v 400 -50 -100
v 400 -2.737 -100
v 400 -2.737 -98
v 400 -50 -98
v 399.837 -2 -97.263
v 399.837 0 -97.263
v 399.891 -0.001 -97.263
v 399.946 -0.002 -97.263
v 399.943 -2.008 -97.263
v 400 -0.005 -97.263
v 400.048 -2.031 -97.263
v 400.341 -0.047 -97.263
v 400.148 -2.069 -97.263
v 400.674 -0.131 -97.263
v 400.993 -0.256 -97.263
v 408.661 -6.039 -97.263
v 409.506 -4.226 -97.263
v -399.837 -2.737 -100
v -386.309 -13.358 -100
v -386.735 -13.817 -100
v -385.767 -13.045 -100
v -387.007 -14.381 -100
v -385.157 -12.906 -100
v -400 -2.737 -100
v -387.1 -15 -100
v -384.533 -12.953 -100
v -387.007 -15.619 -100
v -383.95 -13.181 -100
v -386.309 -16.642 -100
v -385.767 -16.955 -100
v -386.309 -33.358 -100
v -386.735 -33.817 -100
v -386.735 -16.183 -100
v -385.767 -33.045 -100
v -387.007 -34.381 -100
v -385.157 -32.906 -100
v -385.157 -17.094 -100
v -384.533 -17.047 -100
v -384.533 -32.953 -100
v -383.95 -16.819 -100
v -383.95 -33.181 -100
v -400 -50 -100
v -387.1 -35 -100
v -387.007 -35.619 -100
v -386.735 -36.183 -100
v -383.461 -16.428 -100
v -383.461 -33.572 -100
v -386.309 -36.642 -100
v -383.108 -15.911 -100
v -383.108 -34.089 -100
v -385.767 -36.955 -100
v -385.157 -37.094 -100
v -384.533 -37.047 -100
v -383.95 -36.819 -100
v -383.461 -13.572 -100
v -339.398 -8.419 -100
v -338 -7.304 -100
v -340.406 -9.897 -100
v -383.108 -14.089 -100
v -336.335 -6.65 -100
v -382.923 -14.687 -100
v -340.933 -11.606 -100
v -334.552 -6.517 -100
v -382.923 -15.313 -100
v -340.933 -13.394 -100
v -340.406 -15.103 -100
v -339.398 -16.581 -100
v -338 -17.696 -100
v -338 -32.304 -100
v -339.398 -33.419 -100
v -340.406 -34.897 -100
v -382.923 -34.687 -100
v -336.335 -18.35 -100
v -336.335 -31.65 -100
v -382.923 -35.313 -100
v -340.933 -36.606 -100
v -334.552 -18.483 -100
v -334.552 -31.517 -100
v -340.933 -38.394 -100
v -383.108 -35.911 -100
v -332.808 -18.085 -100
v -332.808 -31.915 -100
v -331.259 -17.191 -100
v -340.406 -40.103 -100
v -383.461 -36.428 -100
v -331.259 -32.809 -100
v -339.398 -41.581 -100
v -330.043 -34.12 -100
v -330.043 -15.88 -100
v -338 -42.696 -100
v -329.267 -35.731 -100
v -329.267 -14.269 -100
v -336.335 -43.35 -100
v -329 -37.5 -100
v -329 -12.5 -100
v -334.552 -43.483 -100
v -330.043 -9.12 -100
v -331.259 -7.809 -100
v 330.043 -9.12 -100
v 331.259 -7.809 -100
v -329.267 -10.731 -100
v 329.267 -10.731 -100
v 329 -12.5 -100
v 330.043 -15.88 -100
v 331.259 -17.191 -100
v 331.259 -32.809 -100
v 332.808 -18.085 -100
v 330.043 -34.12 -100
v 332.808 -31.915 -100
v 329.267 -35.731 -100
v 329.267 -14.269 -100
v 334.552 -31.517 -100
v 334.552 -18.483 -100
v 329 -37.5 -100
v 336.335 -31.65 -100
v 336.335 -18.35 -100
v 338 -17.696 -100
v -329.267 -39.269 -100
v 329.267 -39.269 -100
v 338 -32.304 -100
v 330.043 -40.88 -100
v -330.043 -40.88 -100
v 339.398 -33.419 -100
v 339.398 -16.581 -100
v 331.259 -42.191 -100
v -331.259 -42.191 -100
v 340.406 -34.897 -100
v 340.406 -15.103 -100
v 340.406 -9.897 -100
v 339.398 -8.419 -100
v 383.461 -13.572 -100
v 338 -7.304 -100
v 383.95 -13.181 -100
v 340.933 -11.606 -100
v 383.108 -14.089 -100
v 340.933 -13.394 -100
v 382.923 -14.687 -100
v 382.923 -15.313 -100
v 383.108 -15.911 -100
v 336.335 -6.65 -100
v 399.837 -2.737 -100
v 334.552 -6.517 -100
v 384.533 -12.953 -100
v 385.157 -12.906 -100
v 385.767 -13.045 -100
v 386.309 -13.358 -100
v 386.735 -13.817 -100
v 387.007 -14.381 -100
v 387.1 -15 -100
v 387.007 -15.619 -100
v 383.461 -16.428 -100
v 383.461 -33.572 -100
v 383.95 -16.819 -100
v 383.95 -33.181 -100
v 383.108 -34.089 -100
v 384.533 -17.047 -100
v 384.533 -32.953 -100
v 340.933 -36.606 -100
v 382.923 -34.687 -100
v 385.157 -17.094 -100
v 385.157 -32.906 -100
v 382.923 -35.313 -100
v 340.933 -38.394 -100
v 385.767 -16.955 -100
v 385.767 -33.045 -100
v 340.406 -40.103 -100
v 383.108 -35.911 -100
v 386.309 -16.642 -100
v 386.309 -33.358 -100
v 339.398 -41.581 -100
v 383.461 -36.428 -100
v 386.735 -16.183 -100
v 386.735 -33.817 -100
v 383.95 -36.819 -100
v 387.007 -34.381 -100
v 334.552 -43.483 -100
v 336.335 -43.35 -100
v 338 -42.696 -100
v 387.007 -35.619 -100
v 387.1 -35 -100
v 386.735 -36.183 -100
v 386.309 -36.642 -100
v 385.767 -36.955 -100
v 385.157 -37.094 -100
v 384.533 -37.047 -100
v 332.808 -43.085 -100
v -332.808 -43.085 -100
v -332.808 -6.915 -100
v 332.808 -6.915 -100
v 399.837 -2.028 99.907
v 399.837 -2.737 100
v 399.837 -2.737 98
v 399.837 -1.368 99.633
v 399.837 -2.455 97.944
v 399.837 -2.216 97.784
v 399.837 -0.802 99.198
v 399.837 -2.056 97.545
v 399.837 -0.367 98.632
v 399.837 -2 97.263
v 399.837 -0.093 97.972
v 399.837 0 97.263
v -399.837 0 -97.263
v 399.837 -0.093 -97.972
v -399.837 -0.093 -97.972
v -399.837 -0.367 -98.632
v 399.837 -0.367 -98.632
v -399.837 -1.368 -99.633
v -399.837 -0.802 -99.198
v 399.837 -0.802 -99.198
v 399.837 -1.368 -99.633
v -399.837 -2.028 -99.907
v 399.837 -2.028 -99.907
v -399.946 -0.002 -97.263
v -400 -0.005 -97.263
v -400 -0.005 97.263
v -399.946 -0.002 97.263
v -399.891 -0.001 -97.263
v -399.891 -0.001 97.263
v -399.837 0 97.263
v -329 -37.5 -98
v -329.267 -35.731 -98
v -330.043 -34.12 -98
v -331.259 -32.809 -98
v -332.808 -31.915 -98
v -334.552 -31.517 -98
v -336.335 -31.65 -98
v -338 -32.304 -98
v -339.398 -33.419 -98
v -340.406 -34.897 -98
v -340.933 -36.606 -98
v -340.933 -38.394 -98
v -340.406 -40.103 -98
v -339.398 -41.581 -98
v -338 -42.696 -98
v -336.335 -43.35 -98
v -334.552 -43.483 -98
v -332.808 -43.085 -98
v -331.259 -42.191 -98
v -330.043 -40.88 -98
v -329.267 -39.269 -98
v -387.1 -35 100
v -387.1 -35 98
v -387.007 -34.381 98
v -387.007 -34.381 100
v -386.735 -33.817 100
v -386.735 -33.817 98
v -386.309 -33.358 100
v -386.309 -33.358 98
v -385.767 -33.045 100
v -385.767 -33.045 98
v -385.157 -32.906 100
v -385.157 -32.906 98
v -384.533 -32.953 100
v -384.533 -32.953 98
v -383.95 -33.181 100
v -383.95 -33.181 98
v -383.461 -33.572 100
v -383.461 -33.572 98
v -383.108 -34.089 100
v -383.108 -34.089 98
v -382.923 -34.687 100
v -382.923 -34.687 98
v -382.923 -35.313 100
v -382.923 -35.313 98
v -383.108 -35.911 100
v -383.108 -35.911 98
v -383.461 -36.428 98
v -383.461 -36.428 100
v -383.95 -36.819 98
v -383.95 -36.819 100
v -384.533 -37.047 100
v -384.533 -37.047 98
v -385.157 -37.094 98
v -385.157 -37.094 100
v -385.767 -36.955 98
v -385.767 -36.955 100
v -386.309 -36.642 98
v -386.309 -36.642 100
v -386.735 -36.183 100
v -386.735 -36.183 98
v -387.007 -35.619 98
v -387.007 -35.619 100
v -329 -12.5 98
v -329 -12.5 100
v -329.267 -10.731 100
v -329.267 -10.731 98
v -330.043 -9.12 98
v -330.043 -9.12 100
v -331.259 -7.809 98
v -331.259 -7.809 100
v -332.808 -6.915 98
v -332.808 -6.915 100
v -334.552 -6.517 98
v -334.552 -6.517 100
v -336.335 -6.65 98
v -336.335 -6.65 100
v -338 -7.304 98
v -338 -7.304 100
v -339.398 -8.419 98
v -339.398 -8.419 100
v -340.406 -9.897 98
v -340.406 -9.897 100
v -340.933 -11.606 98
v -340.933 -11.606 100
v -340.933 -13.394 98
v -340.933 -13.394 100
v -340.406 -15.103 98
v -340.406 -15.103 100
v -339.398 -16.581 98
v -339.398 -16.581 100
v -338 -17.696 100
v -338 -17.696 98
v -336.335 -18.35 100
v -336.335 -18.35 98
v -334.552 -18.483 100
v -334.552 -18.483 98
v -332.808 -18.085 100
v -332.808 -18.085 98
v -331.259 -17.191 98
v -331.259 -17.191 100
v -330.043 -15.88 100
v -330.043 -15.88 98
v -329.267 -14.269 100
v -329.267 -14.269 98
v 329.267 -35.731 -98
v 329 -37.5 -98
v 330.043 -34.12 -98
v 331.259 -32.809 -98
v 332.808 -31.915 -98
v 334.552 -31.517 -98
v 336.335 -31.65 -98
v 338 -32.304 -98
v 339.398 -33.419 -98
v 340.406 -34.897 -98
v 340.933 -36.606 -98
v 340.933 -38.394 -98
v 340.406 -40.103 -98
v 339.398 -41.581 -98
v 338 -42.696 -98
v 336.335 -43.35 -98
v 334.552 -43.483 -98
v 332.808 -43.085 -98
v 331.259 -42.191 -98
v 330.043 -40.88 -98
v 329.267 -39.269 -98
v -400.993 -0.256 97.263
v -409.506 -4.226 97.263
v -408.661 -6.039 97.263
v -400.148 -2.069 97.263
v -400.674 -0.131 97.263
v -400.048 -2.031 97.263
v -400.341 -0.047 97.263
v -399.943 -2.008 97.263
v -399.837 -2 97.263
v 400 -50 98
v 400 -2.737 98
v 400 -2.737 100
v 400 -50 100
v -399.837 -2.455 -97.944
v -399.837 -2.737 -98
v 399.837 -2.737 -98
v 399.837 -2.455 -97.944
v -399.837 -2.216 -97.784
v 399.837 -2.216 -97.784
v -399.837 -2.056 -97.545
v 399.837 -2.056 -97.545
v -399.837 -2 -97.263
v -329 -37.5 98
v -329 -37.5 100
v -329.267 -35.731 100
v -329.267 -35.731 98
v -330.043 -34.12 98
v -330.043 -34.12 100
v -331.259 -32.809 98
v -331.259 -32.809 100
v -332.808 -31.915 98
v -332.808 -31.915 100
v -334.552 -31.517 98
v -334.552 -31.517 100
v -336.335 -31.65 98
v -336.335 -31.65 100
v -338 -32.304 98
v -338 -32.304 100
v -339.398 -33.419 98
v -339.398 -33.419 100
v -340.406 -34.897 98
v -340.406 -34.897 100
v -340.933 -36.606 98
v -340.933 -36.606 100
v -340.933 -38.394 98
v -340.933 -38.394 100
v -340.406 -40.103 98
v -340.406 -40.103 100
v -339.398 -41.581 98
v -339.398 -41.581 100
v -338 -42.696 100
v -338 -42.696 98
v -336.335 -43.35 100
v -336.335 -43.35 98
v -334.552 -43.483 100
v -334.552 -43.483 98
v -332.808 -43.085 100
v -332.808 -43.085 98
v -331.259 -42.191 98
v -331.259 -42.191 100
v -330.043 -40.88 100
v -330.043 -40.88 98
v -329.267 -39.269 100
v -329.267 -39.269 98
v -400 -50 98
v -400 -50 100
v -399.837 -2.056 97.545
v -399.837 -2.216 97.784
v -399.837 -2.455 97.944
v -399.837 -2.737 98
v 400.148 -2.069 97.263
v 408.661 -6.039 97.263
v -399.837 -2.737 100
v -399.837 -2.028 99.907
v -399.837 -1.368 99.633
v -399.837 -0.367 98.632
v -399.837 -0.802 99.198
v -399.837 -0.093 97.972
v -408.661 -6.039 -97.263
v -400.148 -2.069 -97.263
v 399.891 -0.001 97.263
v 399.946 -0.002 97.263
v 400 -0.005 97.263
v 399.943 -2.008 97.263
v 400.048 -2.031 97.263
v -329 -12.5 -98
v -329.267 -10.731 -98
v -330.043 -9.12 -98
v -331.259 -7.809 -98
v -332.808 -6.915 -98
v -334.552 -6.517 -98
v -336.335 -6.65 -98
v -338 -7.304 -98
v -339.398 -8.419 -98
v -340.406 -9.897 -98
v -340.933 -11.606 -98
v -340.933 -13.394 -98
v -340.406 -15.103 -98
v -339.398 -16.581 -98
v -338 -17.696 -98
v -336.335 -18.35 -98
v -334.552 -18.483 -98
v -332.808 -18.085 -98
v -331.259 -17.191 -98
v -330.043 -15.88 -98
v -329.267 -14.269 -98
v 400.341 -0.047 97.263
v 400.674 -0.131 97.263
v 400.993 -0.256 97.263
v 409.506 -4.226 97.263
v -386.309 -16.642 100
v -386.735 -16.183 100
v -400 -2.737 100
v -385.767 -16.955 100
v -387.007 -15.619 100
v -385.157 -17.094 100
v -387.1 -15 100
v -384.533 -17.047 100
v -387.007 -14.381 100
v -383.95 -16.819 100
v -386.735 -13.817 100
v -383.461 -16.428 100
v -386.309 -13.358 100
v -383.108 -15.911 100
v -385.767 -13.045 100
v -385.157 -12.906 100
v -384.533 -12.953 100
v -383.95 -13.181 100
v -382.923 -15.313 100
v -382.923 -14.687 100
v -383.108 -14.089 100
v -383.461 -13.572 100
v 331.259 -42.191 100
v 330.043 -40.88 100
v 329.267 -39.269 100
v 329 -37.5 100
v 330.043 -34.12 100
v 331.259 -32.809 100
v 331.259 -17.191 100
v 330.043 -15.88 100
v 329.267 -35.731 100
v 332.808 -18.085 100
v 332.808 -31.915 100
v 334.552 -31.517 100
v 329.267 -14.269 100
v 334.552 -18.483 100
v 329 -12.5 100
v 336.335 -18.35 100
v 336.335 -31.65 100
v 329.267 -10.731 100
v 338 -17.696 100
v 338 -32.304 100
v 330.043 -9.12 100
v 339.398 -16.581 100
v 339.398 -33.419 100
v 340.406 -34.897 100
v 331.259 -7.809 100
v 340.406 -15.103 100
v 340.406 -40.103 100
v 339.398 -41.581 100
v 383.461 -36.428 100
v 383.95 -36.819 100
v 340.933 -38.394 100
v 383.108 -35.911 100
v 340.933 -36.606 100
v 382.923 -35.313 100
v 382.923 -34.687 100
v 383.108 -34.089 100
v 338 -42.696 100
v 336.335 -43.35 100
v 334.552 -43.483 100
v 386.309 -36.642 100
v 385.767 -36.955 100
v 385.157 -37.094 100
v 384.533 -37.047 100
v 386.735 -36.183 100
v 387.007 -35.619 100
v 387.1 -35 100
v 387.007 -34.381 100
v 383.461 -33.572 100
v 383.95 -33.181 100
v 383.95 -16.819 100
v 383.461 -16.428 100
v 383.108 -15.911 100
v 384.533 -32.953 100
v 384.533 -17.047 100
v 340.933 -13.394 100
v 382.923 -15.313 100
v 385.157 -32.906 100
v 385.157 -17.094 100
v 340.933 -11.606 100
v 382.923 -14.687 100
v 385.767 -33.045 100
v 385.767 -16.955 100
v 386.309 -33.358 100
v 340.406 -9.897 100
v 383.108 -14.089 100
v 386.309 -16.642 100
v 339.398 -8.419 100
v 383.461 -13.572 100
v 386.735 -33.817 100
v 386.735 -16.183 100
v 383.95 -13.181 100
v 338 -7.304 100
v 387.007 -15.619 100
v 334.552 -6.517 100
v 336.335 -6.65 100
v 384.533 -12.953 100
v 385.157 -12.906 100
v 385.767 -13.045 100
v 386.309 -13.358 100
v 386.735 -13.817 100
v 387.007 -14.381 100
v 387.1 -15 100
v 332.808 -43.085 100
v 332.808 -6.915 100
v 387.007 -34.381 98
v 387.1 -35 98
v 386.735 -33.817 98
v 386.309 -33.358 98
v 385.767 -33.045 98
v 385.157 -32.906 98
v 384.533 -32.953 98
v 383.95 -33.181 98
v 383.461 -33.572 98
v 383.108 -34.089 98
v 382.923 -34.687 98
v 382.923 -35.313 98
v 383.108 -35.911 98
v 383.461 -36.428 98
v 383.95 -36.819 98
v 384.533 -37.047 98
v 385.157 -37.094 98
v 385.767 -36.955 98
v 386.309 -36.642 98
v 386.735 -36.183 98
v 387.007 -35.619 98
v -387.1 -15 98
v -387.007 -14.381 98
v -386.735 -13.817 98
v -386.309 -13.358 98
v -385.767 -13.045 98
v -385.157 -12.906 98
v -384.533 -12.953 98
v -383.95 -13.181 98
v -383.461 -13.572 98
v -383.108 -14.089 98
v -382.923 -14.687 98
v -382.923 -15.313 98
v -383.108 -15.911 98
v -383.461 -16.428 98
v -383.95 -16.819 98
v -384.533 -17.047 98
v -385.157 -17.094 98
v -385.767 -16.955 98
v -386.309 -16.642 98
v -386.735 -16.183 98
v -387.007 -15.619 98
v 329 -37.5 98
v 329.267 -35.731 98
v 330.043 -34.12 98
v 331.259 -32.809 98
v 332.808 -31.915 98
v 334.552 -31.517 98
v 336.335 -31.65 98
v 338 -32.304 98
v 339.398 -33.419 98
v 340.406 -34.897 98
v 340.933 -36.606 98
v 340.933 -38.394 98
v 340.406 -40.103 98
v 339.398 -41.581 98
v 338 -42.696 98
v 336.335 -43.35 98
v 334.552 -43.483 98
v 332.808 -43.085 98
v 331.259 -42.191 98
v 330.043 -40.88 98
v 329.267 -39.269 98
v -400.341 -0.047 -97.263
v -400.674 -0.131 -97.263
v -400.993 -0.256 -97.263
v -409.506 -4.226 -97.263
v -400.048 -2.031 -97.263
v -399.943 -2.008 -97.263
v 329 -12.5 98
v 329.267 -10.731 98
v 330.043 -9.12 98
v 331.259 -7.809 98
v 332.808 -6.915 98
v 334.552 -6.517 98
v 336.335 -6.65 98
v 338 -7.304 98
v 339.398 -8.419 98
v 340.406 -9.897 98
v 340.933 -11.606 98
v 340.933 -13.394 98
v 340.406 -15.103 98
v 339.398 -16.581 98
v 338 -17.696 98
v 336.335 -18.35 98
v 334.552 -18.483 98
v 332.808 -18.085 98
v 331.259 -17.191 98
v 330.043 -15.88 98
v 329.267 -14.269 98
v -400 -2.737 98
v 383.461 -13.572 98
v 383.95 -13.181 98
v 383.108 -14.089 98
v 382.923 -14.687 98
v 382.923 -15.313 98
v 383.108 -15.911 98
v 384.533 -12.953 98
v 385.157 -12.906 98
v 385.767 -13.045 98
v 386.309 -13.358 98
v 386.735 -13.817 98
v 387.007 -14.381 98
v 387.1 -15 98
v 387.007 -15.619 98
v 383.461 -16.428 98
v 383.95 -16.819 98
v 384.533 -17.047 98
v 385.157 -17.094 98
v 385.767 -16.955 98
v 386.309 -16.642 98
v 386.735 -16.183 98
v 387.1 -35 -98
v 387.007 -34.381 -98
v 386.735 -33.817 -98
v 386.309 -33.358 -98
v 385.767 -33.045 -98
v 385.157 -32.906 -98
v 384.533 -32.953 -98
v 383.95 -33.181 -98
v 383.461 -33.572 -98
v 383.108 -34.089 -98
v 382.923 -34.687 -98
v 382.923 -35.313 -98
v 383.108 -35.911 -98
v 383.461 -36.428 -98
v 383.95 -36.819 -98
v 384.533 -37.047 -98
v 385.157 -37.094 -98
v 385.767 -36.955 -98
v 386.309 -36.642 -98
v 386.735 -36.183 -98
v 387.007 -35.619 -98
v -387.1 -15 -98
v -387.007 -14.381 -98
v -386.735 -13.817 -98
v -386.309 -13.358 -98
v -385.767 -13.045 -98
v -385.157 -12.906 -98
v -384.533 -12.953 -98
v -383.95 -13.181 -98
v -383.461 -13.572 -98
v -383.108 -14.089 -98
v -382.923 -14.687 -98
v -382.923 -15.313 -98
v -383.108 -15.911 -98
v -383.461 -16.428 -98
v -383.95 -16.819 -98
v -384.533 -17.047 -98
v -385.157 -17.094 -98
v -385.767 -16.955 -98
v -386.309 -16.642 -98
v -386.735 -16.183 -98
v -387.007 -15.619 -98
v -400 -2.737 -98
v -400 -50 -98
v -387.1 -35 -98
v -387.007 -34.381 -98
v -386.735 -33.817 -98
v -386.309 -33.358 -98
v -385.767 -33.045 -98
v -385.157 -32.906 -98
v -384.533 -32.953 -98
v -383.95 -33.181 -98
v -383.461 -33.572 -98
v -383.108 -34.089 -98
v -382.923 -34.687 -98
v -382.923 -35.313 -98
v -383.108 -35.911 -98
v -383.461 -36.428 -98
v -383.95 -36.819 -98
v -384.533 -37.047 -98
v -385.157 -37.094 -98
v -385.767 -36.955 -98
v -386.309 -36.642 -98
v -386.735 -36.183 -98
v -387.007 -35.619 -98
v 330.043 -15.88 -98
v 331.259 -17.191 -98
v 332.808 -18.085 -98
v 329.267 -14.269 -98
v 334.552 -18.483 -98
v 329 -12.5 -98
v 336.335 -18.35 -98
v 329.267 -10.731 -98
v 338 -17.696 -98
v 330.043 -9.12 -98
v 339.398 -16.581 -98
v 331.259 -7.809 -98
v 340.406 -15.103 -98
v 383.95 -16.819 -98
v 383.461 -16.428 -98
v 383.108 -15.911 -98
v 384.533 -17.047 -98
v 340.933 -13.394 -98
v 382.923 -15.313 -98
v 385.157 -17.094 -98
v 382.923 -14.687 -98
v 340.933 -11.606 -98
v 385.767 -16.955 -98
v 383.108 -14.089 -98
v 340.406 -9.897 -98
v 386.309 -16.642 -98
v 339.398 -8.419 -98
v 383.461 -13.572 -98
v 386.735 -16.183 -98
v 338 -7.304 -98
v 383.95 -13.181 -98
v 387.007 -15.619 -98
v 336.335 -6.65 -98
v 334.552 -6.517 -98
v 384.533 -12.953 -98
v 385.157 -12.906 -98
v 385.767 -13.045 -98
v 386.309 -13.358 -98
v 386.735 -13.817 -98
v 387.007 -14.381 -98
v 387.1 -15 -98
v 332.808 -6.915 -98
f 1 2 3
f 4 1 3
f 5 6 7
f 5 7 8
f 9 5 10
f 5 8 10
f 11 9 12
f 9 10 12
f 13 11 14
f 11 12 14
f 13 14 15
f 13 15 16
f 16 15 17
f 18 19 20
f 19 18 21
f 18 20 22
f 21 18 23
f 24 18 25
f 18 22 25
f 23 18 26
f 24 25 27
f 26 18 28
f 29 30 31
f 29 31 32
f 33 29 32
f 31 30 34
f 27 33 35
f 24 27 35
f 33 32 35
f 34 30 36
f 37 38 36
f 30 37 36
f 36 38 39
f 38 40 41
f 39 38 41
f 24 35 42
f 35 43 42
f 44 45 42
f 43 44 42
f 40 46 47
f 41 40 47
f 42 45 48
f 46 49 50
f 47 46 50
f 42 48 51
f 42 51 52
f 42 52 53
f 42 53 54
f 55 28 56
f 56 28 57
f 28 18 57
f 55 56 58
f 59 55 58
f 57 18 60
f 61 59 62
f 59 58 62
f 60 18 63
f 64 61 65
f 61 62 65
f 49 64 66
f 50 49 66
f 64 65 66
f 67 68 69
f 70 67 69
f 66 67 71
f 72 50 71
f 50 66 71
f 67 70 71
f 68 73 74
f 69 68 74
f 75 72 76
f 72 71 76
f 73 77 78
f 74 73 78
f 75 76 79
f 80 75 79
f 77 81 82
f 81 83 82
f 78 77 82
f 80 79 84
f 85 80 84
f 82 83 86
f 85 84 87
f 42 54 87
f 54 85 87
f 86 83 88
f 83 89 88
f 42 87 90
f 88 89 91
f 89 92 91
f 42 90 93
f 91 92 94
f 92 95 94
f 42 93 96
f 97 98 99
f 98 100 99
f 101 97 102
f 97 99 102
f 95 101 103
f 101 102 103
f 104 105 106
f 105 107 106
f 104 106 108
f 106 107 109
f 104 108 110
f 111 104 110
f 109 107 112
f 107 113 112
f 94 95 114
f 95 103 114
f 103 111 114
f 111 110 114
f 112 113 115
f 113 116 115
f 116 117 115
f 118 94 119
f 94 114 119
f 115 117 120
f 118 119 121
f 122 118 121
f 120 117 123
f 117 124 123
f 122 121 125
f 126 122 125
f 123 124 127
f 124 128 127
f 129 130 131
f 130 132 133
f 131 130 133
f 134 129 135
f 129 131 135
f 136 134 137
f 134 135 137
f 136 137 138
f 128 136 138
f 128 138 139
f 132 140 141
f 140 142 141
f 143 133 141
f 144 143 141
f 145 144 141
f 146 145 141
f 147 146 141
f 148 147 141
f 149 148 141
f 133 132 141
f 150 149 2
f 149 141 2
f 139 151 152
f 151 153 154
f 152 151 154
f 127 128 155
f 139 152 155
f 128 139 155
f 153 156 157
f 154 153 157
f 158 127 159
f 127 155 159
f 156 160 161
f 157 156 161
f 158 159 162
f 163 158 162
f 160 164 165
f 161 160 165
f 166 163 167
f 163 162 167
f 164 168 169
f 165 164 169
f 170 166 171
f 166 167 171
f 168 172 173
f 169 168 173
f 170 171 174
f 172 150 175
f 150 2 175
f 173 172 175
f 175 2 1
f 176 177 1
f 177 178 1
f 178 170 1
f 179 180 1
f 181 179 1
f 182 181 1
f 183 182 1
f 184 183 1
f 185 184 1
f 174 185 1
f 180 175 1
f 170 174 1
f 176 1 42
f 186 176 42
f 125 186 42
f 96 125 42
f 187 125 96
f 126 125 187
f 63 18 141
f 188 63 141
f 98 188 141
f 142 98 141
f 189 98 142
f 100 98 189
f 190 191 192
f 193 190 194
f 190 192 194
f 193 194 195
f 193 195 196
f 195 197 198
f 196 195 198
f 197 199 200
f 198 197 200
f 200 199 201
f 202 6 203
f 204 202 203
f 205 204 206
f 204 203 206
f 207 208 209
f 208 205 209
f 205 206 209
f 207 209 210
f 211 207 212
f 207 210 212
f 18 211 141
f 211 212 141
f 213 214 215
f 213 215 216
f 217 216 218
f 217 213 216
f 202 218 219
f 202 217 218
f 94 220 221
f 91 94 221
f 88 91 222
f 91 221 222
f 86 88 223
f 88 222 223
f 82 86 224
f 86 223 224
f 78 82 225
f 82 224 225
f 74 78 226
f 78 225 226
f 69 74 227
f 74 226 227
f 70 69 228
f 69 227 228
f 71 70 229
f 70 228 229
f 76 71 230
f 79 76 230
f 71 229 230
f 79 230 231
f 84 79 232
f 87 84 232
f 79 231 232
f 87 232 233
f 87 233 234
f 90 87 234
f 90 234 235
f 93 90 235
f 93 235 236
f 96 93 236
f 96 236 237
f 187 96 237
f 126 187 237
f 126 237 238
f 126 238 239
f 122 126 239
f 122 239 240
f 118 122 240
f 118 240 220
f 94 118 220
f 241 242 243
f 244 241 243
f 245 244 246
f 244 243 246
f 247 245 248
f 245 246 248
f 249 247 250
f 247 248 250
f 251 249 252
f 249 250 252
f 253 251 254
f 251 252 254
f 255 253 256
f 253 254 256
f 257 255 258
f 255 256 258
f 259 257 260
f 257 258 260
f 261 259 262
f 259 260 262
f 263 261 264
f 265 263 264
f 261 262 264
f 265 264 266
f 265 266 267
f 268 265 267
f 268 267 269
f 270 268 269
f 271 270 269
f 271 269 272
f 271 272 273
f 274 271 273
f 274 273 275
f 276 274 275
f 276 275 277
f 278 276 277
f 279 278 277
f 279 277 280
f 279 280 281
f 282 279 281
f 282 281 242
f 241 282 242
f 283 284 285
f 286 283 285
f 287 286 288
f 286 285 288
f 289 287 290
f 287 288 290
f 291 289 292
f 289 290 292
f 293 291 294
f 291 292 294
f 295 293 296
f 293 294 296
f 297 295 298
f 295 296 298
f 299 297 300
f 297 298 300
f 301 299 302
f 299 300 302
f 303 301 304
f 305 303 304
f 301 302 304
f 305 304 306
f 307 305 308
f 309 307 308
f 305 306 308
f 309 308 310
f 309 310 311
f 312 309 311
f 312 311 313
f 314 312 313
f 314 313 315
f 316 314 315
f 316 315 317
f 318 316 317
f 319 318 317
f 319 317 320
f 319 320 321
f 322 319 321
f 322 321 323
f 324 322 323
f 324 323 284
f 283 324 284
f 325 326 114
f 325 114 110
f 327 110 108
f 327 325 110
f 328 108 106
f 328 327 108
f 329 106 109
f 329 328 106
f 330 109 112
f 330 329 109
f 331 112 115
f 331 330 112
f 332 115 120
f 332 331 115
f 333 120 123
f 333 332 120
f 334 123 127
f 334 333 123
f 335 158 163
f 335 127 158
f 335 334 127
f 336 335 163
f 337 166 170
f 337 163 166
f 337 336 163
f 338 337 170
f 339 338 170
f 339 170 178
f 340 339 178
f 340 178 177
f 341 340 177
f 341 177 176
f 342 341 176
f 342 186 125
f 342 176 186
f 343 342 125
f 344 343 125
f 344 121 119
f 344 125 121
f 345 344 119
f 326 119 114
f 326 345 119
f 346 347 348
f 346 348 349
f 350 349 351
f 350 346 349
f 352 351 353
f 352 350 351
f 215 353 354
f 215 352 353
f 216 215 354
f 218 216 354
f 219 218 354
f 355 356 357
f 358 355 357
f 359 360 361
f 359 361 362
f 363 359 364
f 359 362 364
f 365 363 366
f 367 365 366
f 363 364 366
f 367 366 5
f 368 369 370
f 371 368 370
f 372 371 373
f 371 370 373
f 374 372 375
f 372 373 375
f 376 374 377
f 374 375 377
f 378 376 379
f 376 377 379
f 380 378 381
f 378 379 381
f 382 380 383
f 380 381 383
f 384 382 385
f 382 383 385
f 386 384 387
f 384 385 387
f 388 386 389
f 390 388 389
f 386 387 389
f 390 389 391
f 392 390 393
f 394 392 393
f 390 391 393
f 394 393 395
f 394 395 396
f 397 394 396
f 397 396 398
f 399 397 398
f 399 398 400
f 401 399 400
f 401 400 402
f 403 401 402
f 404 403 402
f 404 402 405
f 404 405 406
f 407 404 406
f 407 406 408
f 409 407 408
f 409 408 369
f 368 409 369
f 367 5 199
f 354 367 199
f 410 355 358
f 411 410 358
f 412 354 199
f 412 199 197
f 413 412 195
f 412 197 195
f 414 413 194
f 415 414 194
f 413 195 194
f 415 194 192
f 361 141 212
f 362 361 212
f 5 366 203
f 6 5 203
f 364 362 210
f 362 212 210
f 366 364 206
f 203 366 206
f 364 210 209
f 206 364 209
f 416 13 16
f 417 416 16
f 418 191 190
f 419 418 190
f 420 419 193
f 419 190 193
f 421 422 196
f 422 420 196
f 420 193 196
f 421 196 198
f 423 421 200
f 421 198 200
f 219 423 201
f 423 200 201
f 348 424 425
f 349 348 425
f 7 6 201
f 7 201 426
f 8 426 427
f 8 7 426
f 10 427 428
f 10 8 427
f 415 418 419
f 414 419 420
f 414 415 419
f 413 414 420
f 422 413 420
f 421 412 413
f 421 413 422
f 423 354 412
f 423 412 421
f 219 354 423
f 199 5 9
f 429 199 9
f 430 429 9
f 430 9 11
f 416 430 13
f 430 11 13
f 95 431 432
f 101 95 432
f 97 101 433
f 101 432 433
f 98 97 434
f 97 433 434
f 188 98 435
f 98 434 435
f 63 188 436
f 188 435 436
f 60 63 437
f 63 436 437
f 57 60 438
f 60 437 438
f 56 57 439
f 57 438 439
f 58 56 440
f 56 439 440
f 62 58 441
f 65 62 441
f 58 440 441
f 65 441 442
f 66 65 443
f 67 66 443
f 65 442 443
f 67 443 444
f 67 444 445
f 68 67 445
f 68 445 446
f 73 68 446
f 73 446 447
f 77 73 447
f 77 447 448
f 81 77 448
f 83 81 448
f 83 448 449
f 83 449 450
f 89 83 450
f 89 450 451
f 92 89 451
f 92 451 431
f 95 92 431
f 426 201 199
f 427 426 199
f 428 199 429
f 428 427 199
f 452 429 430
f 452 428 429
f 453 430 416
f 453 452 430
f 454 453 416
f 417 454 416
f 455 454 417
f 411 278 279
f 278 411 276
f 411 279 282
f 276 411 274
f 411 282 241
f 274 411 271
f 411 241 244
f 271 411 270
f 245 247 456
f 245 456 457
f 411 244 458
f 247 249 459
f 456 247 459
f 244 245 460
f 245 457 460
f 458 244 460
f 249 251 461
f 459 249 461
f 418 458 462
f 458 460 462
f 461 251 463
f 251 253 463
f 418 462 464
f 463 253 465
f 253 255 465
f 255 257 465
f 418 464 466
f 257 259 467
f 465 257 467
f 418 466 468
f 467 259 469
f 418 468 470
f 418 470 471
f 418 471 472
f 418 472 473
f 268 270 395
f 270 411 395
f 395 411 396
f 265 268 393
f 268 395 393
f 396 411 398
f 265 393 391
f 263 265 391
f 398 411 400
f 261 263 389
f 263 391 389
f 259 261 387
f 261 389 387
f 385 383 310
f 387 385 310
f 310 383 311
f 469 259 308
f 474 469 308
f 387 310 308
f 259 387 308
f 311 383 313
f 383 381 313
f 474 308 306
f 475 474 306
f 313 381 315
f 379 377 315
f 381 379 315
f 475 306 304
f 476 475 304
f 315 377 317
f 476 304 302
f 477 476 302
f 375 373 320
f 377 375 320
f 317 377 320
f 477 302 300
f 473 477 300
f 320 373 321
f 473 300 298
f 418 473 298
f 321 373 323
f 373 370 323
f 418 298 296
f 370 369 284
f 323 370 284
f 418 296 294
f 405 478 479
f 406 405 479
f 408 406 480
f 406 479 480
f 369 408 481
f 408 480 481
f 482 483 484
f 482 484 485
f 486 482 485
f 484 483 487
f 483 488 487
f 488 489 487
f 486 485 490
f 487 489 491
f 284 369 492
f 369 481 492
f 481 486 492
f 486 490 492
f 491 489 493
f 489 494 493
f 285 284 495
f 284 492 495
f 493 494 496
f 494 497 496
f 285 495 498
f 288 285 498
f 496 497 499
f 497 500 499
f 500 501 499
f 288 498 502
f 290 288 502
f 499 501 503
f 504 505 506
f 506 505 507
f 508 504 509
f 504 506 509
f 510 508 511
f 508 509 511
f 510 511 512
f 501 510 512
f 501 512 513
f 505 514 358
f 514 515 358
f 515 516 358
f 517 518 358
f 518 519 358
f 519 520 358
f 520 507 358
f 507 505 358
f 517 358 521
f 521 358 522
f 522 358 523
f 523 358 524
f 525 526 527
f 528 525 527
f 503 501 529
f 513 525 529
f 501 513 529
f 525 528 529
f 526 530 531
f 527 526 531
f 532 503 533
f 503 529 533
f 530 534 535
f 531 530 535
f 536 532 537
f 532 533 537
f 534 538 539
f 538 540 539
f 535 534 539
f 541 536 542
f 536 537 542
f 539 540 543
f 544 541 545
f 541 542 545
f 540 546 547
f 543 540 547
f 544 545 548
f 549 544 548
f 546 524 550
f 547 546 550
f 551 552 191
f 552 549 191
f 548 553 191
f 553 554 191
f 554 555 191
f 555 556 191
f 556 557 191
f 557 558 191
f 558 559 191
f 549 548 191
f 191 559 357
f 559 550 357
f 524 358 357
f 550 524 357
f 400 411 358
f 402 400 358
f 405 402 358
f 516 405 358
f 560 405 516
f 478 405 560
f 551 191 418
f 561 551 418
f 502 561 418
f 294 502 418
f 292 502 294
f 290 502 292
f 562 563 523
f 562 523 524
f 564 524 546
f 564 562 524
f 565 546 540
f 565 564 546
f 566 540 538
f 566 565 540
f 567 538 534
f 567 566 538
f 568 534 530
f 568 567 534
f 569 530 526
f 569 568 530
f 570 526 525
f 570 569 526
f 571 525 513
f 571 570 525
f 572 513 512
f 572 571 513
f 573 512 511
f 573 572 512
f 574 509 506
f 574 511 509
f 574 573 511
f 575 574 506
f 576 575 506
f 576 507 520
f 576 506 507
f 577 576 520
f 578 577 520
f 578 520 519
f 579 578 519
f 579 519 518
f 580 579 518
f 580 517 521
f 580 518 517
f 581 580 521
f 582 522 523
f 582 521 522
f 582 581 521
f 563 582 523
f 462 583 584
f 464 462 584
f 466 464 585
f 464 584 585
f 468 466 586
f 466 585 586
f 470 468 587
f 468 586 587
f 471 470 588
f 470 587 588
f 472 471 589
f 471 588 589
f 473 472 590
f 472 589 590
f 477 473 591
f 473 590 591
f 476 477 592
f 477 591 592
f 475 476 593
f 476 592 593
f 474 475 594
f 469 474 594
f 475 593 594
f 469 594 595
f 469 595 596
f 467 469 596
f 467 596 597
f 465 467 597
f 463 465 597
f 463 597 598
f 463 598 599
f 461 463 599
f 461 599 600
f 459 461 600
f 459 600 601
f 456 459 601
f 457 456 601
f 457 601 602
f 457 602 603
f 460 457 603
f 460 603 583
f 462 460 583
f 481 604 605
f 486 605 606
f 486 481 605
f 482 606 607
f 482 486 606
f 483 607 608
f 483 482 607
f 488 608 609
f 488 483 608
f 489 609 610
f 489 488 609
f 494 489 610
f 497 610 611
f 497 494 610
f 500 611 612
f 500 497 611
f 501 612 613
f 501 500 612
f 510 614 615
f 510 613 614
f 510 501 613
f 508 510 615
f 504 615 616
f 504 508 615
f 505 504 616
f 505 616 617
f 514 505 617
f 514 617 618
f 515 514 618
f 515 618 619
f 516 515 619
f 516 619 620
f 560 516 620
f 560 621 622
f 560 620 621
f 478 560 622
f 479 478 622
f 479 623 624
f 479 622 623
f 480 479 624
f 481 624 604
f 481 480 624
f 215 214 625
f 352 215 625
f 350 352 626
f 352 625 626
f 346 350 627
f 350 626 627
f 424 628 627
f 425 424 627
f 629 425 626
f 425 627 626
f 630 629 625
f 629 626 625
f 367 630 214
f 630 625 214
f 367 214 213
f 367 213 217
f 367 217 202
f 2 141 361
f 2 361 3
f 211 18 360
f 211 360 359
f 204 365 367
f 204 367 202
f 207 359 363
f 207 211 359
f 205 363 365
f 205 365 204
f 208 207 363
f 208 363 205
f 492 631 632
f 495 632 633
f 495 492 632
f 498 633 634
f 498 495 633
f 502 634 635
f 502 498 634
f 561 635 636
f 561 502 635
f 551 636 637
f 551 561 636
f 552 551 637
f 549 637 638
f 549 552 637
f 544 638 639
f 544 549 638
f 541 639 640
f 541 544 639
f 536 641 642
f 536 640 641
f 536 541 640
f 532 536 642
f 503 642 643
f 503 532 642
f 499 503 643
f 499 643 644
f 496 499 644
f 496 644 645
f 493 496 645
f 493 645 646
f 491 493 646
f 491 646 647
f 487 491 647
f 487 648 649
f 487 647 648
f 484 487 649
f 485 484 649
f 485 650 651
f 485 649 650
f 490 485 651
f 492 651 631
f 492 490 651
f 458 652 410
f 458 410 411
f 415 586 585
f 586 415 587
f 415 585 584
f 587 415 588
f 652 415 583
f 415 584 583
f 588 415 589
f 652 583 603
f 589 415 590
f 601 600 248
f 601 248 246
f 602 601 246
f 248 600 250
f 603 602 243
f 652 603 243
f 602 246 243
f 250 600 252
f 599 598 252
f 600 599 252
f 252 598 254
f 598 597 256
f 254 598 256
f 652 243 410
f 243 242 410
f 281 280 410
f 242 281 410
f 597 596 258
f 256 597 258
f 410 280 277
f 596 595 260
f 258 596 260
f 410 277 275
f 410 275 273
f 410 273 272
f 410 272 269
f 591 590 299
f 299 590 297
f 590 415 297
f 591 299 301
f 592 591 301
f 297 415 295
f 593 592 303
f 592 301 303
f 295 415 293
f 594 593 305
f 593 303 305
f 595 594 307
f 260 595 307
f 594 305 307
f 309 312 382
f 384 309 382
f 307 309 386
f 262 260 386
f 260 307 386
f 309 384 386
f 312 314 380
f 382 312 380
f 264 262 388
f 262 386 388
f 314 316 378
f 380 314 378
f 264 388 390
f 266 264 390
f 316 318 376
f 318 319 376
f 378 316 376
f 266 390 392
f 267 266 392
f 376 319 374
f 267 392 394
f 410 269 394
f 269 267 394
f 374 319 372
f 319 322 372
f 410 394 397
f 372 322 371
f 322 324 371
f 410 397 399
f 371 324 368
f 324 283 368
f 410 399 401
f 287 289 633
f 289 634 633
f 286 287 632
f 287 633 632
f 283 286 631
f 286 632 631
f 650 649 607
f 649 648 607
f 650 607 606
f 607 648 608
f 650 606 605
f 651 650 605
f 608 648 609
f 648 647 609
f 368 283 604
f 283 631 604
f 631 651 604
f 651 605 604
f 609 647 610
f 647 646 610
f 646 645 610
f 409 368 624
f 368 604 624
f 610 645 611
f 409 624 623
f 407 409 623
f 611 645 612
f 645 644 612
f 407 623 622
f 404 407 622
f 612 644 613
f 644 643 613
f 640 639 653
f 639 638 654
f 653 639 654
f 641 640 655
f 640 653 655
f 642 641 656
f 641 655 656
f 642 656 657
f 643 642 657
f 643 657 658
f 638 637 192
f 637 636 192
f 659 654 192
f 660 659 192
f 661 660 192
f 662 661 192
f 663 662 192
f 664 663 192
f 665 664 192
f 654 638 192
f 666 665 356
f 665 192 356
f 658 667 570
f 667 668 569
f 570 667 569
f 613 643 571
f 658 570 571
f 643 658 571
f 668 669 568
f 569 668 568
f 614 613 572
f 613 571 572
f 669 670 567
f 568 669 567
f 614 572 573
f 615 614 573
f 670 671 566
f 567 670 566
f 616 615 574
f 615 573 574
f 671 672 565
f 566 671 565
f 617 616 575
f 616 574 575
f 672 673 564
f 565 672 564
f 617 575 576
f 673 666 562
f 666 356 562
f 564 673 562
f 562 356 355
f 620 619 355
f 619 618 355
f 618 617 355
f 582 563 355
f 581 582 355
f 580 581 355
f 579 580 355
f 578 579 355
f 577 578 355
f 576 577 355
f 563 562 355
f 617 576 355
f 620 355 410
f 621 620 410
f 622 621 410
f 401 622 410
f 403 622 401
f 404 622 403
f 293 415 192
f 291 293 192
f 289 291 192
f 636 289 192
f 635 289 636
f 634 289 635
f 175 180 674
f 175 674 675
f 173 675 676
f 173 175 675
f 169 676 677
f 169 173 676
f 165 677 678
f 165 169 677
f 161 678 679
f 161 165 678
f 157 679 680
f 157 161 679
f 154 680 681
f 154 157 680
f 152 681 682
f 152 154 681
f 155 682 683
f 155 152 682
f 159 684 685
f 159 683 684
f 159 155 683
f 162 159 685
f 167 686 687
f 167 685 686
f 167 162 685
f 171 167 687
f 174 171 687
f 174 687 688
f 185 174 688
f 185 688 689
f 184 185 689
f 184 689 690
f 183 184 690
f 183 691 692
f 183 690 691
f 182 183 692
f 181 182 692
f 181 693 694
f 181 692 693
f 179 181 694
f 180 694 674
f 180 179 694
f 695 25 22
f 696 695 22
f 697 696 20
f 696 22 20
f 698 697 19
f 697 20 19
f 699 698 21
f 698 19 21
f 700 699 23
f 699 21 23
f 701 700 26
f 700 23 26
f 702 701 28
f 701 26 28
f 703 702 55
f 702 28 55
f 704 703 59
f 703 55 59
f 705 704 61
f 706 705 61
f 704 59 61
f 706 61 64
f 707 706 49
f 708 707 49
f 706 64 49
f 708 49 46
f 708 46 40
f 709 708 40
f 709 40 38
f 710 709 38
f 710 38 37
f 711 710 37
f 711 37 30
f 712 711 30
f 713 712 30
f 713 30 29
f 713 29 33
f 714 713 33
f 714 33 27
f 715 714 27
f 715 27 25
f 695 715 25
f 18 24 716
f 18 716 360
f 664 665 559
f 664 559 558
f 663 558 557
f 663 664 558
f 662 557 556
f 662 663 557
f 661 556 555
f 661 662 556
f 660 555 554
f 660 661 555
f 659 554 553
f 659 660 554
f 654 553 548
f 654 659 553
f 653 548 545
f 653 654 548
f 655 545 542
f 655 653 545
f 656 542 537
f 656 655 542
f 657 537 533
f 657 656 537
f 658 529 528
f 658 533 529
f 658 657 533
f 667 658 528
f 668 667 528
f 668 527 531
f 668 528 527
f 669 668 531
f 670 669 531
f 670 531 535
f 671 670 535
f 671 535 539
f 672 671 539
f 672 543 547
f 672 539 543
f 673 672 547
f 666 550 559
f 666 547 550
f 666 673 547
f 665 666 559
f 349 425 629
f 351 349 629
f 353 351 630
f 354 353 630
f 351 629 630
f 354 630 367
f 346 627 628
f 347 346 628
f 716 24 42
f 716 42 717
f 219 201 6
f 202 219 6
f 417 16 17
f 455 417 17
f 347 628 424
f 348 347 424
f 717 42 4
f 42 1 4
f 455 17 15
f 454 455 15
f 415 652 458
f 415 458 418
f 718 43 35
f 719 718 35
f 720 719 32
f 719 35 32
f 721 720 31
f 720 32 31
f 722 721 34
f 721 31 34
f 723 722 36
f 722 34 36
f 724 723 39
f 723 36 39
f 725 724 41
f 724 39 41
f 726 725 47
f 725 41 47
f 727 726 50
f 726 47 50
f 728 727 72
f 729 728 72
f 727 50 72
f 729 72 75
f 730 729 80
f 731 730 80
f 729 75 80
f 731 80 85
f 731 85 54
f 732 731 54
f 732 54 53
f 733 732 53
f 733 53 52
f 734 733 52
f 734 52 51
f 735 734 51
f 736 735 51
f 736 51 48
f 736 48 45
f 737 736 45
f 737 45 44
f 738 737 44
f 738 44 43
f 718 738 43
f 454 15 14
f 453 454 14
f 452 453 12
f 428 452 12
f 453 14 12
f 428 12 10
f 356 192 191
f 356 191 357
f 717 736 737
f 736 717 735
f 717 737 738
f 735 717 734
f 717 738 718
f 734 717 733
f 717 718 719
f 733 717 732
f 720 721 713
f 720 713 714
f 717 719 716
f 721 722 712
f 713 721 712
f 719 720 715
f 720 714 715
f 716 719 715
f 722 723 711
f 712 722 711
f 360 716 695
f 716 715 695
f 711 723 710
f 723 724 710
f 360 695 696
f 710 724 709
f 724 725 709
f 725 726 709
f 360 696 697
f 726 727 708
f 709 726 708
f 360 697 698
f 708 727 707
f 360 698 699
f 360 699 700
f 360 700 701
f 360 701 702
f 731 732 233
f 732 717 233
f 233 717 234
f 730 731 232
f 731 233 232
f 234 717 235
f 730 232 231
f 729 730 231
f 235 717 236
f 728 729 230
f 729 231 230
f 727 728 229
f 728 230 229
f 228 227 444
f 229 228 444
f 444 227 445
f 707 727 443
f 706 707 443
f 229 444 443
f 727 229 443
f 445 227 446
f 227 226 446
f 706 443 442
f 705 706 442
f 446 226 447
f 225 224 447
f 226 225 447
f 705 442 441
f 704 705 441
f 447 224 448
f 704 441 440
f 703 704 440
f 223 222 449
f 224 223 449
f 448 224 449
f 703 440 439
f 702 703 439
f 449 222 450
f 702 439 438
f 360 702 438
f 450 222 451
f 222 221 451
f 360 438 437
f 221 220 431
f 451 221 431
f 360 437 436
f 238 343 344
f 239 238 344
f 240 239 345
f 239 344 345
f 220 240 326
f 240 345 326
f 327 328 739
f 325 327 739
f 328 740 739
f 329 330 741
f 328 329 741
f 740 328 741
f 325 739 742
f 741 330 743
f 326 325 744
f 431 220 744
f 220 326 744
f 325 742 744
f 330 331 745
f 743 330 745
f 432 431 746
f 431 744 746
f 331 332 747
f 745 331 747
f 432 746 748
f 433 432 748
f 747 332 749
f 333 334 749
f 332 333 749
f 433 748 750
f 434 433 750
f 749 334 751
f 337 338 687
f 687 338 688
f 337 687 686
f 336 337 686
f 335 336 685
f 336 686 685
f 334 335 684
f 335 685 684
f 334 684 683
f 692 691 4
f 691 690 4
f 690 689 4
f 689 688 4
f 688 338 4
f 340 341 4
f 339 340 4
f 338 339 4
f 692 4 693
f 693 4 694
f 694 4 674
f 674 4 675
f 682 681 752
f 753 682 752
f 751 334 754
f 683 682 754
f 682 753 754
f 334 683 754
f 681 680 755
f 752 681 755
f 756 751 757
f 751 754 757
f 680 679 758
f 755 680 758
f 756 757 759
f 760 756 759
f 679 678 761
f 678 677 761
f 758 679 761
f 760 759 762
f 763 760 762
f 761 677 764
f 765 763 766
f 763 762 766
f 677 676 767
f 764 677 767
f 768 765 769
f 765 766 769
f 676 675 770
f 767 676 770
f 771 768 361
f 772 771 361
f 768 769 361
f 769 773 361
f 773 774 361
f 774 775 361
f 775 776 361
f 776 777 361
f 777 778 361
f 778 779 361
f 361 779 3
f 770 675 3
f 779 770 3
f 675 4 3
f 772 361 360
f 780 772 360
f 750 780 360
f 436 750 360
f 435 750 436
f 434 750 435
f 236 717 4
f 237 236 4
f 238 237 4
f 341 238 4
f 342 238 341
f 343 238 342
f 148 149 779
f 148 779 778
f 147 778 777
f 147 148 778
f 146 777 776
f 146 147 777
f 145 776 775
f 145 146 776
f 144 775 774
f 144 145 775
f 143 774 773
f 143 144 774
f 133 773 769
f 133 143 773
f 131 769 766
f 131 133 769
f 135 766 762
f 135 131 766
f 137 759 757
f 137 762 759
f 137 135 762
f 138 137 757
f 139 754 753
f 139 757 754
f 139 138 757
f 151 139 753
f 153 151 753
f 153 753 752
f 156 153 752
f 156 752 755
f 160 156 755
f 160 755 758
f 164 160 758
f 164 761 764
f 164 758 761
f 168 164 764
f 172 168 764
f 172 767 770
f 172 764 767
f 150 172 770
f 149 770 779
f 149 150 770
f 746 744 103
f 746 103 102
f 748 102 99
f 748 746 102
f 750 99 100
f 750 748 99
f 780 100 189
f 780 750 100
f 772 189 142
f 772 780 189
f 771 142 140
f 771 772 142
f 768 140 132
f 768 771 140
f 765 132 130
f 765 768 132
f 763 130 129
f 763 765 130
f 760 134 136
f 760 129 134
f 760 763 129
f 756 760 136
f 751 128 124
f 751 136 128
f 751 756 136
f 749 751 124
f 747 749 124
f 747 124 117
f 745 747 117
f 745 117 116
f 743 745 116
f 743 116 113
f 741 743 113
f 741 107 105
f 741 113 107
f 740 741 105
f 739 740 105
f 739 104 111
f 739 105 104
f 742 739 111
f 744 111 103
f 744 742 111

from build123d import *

# Parameters (mm, degrees)
TABAN_FLAN_1_DEPTH       = 400
M5_DI_LI_DELIK1_D        = 4.2
IZIM10_R                 = 6
KES_EKSTR_ZYON1_DEPTH    = 451
KENAR_FLAN_1_START       = -100
KENAR_FLAN_1_OUTLINE_W   = 0.163300289
KENAR_FLAN_1_OUTLINE_H   = 2.7366
KENAR_FLAN_1_DEPTH       = 2.7366
KENAR_FLAN_1_START_2     = 97.2634
KENAR_FLAN_1_2_OUTLINE_W = 0.163300289
KENAR_FLAN_1_2_OUTLINE_H = 2.7366
KENAR_FLAN_1_2_DEPTH     = 2.7366
KENAR_FLAN_1_START_3     = -97.2634
KENAR_FLAN_1_3_DEPTH     = 194.5268
KENAR_FLAN_1_4_DEPTH     = 194.5268


# Read off the part's stored shape, not the designer's step: Kenar-Flanş1
# Sheet-metal steps are written as plain solids
with BuildPart() as part:
    # Çizim1 → Taban-Flanş1 (new, symmetric)
    with BuildSketch(Plane(origin=(0, 0, 0), x_dir=(0, 0, -1), z_dir=(1, 0, 0))):
        with BuildLine():
            Line((-100, -50), (-100, -2.7366))
            ThreePointArc((-100, -2.7366), (-99.198468417, -0.801531583), (-97.2634, 0))
            Line((-97.2634, 0), (97.2634, 0))
            ThreePointArc((97.2634, 0), (99.198468417, -0.801531583), (100, -2.7366))
            Line((100, -2.7366), (100, -50))
            Line((100, -50), (98, -50))
            Line((98, -50), (98, -2.7366))
            ThreePointArc((98, -2.7366), (97.784254855, -2.215745145), (97.2634, -2))
            Line((97.2634, -2), (-97.2634, -2))
            ThreePointArc((-97.2634, -2), (-97.784254855, -2.215745145), (-98, -2.7366))
            Line((-98, -2.7366), (-98, -50))
            Line((-98, -50), (-100, -50))
        make_face()
    extrude(amount=TABAN_FLAN_1_DEPTH, both=True)

    # M5 Dişli Delik1 (through all)
    with Locations(Plane(origin=(-385, -15, 100), x_dir=(1, 0, 0), z_dir=(0, 0, 1))):
        with Locations((0, 0), (0, -20)):
            m5_di_li_delik1 = Hole(M5_DI_LI_DELIK1_D / 2)

    # Çizim10 → Kes-Ekstrüzyon1 (cut, through all)
    with BuildSketch(Plane.XY.offset(100)):
        with Locations((-335, -12.5)):
            Circle(IZIM10_R)
        with Locations((-335, -37.5)):
            Circle(IZIM10_R)
    kes_ekstr_zyon1 = extrude(amount=-KES_EKSTR_ZYON1_DEPTH, mode=Mode.SUBTRACT)

    # Aynalama1: M5 Dişli Delik1, Kes-Ekstrüzyon1 across plane
    add(m5_di_li_delik1.mirror(Plane(origin=(0, 0, 0), x_dir=(0, 0, 1), z_dir=(1, 0, 0))), mode=Mode.SUBTRACT)
    add(kes_ekstr_zyon1.mirror(Plane(origin=(0, 0, 0), x_dir=(0, 0, 1), z_dir=(1, 0, 0))), mode=Mode.SUBTRACT)

    # Kenar-Flanş1 outline → Kenar-Flanş1 (cut)
    with BuildSketch(Plane.XY.offset(KENAR_FLAN_1_START)):
        with Locations((399.918349856, -1.3683)):
            Rectangle(KENAR_FLAN_1_OUTLINE_W, KENAR_FLAN_1_OUTLINE_H)
        with Locations((-399.918349856, -1.3683)):
            Rectangle(KENAR_FLAN_1_OUTLINE_W, KENAR_FLAN_1_OUTLINE_H)
    extrude(amount=KENAR_FLAN_1_DEPTH, mode=Mode.SUBTRACT)

    # Kenar-Flan_1 2 outline → Kenar-Flan_1 2 (cut)
    with BuildSketch(Plane.XY.offset(KENAR_FLAN_1_START_2)):
        with Locations((399.918349856, -1.3683)):
            Rectangle(KENAR_FLAN_1_2_OUTLINE_W, KENAR_FLAN_1_2_OUTLINE_H)
        with Locations((-399.918349856, -1.3683)):
            Rectangle(KENAR_FLAN_1_2_OUTLINE_W, KENAR_FLAN_1_2_OUTLINE_H)
    extrude(amount=KENAR_FLAN_1_2_DEPTH, mode=Mode.SUBTRACT)

    # Kenar-Flan_1 3 outline → Kenar-Flan_1 3 (cut)
    with BuildSketch(Plane.XY.offset(KENAR_FLAN_1_START_3)):
        with BuildLine():
            Line((400, 0), (399.836699711, 0))
            ThreePointArc((399.836699711, 0), (399.918386255, -0.001219429), (400, -0.004876629))
            Line((400, -0.004876629), (400, 0))
        make_face()
        with BuildLine():
            ThreePointArc((-400, -0.004876629), (-399.918386255, -0.001219429), (-399.836699711, 0))
            Line((-399.836699711, 0), (-400, 0))
            Line((-400, 0), (-400, -0.004876629))
        make_face()
    extrude(amount=KENAR_FLAN_1_3_DEPTH, mode=Mode.SUBTRACT)

    # Kenar-Flan_1 4 outline → Kenar-Flan_1 4 (add)
    with BuildSketch(Plane.XY.offset(KENAR_FLAN_1_START_3)):
        with BuildLine():
            Line((400, -0.004876629), (400, -2))
            Line((400, -2), (399.836699711, -2))
            ThreePointArc((399.836699711, -2), (399.996129131, -2.017460361), (400.148000323, -2.069013684))
            Line((400.148000323, -2.069013684), (408.661230672, -6.038798191))
            Line((408.661230672, -6.038798191), (409.506467196, -4.226182617))
            Line((409.506467196, -4.226182617), (400.993236847, -0.25639811))
            ThreePointArc((400.993236847, -0.25639811), (400.508494673, -0.083739075), (400, -0.004876629))
        make_face()
        with BuildLine():
            Line((-399.836699711, -2), (-400, -2))
            Line((-400, -2), (-400, -0.004876629))
            ThreePointArc((-400, -0.004876629), (-400.508494673, -0.083739075), (-400.993236847, -0.25639811))
            Line((-400.993236847, -0.25639811), (-409.506467196, -4.226182617))
            Line((-409.506467196, -4.226182617), (-408.661230672, -6.038798191))
            Line((-408.661230672, -6.038798191), (-400.148000323, -2.069013684))
            ThreePointArc((-400.148000323, -2.069013684), (-399.996129131, -2.017460361), (-399.836699711, -2))
        make_face()
    extrude(amount=KENAR_FLAN_1_4_DEPTH)


solid = part.part
